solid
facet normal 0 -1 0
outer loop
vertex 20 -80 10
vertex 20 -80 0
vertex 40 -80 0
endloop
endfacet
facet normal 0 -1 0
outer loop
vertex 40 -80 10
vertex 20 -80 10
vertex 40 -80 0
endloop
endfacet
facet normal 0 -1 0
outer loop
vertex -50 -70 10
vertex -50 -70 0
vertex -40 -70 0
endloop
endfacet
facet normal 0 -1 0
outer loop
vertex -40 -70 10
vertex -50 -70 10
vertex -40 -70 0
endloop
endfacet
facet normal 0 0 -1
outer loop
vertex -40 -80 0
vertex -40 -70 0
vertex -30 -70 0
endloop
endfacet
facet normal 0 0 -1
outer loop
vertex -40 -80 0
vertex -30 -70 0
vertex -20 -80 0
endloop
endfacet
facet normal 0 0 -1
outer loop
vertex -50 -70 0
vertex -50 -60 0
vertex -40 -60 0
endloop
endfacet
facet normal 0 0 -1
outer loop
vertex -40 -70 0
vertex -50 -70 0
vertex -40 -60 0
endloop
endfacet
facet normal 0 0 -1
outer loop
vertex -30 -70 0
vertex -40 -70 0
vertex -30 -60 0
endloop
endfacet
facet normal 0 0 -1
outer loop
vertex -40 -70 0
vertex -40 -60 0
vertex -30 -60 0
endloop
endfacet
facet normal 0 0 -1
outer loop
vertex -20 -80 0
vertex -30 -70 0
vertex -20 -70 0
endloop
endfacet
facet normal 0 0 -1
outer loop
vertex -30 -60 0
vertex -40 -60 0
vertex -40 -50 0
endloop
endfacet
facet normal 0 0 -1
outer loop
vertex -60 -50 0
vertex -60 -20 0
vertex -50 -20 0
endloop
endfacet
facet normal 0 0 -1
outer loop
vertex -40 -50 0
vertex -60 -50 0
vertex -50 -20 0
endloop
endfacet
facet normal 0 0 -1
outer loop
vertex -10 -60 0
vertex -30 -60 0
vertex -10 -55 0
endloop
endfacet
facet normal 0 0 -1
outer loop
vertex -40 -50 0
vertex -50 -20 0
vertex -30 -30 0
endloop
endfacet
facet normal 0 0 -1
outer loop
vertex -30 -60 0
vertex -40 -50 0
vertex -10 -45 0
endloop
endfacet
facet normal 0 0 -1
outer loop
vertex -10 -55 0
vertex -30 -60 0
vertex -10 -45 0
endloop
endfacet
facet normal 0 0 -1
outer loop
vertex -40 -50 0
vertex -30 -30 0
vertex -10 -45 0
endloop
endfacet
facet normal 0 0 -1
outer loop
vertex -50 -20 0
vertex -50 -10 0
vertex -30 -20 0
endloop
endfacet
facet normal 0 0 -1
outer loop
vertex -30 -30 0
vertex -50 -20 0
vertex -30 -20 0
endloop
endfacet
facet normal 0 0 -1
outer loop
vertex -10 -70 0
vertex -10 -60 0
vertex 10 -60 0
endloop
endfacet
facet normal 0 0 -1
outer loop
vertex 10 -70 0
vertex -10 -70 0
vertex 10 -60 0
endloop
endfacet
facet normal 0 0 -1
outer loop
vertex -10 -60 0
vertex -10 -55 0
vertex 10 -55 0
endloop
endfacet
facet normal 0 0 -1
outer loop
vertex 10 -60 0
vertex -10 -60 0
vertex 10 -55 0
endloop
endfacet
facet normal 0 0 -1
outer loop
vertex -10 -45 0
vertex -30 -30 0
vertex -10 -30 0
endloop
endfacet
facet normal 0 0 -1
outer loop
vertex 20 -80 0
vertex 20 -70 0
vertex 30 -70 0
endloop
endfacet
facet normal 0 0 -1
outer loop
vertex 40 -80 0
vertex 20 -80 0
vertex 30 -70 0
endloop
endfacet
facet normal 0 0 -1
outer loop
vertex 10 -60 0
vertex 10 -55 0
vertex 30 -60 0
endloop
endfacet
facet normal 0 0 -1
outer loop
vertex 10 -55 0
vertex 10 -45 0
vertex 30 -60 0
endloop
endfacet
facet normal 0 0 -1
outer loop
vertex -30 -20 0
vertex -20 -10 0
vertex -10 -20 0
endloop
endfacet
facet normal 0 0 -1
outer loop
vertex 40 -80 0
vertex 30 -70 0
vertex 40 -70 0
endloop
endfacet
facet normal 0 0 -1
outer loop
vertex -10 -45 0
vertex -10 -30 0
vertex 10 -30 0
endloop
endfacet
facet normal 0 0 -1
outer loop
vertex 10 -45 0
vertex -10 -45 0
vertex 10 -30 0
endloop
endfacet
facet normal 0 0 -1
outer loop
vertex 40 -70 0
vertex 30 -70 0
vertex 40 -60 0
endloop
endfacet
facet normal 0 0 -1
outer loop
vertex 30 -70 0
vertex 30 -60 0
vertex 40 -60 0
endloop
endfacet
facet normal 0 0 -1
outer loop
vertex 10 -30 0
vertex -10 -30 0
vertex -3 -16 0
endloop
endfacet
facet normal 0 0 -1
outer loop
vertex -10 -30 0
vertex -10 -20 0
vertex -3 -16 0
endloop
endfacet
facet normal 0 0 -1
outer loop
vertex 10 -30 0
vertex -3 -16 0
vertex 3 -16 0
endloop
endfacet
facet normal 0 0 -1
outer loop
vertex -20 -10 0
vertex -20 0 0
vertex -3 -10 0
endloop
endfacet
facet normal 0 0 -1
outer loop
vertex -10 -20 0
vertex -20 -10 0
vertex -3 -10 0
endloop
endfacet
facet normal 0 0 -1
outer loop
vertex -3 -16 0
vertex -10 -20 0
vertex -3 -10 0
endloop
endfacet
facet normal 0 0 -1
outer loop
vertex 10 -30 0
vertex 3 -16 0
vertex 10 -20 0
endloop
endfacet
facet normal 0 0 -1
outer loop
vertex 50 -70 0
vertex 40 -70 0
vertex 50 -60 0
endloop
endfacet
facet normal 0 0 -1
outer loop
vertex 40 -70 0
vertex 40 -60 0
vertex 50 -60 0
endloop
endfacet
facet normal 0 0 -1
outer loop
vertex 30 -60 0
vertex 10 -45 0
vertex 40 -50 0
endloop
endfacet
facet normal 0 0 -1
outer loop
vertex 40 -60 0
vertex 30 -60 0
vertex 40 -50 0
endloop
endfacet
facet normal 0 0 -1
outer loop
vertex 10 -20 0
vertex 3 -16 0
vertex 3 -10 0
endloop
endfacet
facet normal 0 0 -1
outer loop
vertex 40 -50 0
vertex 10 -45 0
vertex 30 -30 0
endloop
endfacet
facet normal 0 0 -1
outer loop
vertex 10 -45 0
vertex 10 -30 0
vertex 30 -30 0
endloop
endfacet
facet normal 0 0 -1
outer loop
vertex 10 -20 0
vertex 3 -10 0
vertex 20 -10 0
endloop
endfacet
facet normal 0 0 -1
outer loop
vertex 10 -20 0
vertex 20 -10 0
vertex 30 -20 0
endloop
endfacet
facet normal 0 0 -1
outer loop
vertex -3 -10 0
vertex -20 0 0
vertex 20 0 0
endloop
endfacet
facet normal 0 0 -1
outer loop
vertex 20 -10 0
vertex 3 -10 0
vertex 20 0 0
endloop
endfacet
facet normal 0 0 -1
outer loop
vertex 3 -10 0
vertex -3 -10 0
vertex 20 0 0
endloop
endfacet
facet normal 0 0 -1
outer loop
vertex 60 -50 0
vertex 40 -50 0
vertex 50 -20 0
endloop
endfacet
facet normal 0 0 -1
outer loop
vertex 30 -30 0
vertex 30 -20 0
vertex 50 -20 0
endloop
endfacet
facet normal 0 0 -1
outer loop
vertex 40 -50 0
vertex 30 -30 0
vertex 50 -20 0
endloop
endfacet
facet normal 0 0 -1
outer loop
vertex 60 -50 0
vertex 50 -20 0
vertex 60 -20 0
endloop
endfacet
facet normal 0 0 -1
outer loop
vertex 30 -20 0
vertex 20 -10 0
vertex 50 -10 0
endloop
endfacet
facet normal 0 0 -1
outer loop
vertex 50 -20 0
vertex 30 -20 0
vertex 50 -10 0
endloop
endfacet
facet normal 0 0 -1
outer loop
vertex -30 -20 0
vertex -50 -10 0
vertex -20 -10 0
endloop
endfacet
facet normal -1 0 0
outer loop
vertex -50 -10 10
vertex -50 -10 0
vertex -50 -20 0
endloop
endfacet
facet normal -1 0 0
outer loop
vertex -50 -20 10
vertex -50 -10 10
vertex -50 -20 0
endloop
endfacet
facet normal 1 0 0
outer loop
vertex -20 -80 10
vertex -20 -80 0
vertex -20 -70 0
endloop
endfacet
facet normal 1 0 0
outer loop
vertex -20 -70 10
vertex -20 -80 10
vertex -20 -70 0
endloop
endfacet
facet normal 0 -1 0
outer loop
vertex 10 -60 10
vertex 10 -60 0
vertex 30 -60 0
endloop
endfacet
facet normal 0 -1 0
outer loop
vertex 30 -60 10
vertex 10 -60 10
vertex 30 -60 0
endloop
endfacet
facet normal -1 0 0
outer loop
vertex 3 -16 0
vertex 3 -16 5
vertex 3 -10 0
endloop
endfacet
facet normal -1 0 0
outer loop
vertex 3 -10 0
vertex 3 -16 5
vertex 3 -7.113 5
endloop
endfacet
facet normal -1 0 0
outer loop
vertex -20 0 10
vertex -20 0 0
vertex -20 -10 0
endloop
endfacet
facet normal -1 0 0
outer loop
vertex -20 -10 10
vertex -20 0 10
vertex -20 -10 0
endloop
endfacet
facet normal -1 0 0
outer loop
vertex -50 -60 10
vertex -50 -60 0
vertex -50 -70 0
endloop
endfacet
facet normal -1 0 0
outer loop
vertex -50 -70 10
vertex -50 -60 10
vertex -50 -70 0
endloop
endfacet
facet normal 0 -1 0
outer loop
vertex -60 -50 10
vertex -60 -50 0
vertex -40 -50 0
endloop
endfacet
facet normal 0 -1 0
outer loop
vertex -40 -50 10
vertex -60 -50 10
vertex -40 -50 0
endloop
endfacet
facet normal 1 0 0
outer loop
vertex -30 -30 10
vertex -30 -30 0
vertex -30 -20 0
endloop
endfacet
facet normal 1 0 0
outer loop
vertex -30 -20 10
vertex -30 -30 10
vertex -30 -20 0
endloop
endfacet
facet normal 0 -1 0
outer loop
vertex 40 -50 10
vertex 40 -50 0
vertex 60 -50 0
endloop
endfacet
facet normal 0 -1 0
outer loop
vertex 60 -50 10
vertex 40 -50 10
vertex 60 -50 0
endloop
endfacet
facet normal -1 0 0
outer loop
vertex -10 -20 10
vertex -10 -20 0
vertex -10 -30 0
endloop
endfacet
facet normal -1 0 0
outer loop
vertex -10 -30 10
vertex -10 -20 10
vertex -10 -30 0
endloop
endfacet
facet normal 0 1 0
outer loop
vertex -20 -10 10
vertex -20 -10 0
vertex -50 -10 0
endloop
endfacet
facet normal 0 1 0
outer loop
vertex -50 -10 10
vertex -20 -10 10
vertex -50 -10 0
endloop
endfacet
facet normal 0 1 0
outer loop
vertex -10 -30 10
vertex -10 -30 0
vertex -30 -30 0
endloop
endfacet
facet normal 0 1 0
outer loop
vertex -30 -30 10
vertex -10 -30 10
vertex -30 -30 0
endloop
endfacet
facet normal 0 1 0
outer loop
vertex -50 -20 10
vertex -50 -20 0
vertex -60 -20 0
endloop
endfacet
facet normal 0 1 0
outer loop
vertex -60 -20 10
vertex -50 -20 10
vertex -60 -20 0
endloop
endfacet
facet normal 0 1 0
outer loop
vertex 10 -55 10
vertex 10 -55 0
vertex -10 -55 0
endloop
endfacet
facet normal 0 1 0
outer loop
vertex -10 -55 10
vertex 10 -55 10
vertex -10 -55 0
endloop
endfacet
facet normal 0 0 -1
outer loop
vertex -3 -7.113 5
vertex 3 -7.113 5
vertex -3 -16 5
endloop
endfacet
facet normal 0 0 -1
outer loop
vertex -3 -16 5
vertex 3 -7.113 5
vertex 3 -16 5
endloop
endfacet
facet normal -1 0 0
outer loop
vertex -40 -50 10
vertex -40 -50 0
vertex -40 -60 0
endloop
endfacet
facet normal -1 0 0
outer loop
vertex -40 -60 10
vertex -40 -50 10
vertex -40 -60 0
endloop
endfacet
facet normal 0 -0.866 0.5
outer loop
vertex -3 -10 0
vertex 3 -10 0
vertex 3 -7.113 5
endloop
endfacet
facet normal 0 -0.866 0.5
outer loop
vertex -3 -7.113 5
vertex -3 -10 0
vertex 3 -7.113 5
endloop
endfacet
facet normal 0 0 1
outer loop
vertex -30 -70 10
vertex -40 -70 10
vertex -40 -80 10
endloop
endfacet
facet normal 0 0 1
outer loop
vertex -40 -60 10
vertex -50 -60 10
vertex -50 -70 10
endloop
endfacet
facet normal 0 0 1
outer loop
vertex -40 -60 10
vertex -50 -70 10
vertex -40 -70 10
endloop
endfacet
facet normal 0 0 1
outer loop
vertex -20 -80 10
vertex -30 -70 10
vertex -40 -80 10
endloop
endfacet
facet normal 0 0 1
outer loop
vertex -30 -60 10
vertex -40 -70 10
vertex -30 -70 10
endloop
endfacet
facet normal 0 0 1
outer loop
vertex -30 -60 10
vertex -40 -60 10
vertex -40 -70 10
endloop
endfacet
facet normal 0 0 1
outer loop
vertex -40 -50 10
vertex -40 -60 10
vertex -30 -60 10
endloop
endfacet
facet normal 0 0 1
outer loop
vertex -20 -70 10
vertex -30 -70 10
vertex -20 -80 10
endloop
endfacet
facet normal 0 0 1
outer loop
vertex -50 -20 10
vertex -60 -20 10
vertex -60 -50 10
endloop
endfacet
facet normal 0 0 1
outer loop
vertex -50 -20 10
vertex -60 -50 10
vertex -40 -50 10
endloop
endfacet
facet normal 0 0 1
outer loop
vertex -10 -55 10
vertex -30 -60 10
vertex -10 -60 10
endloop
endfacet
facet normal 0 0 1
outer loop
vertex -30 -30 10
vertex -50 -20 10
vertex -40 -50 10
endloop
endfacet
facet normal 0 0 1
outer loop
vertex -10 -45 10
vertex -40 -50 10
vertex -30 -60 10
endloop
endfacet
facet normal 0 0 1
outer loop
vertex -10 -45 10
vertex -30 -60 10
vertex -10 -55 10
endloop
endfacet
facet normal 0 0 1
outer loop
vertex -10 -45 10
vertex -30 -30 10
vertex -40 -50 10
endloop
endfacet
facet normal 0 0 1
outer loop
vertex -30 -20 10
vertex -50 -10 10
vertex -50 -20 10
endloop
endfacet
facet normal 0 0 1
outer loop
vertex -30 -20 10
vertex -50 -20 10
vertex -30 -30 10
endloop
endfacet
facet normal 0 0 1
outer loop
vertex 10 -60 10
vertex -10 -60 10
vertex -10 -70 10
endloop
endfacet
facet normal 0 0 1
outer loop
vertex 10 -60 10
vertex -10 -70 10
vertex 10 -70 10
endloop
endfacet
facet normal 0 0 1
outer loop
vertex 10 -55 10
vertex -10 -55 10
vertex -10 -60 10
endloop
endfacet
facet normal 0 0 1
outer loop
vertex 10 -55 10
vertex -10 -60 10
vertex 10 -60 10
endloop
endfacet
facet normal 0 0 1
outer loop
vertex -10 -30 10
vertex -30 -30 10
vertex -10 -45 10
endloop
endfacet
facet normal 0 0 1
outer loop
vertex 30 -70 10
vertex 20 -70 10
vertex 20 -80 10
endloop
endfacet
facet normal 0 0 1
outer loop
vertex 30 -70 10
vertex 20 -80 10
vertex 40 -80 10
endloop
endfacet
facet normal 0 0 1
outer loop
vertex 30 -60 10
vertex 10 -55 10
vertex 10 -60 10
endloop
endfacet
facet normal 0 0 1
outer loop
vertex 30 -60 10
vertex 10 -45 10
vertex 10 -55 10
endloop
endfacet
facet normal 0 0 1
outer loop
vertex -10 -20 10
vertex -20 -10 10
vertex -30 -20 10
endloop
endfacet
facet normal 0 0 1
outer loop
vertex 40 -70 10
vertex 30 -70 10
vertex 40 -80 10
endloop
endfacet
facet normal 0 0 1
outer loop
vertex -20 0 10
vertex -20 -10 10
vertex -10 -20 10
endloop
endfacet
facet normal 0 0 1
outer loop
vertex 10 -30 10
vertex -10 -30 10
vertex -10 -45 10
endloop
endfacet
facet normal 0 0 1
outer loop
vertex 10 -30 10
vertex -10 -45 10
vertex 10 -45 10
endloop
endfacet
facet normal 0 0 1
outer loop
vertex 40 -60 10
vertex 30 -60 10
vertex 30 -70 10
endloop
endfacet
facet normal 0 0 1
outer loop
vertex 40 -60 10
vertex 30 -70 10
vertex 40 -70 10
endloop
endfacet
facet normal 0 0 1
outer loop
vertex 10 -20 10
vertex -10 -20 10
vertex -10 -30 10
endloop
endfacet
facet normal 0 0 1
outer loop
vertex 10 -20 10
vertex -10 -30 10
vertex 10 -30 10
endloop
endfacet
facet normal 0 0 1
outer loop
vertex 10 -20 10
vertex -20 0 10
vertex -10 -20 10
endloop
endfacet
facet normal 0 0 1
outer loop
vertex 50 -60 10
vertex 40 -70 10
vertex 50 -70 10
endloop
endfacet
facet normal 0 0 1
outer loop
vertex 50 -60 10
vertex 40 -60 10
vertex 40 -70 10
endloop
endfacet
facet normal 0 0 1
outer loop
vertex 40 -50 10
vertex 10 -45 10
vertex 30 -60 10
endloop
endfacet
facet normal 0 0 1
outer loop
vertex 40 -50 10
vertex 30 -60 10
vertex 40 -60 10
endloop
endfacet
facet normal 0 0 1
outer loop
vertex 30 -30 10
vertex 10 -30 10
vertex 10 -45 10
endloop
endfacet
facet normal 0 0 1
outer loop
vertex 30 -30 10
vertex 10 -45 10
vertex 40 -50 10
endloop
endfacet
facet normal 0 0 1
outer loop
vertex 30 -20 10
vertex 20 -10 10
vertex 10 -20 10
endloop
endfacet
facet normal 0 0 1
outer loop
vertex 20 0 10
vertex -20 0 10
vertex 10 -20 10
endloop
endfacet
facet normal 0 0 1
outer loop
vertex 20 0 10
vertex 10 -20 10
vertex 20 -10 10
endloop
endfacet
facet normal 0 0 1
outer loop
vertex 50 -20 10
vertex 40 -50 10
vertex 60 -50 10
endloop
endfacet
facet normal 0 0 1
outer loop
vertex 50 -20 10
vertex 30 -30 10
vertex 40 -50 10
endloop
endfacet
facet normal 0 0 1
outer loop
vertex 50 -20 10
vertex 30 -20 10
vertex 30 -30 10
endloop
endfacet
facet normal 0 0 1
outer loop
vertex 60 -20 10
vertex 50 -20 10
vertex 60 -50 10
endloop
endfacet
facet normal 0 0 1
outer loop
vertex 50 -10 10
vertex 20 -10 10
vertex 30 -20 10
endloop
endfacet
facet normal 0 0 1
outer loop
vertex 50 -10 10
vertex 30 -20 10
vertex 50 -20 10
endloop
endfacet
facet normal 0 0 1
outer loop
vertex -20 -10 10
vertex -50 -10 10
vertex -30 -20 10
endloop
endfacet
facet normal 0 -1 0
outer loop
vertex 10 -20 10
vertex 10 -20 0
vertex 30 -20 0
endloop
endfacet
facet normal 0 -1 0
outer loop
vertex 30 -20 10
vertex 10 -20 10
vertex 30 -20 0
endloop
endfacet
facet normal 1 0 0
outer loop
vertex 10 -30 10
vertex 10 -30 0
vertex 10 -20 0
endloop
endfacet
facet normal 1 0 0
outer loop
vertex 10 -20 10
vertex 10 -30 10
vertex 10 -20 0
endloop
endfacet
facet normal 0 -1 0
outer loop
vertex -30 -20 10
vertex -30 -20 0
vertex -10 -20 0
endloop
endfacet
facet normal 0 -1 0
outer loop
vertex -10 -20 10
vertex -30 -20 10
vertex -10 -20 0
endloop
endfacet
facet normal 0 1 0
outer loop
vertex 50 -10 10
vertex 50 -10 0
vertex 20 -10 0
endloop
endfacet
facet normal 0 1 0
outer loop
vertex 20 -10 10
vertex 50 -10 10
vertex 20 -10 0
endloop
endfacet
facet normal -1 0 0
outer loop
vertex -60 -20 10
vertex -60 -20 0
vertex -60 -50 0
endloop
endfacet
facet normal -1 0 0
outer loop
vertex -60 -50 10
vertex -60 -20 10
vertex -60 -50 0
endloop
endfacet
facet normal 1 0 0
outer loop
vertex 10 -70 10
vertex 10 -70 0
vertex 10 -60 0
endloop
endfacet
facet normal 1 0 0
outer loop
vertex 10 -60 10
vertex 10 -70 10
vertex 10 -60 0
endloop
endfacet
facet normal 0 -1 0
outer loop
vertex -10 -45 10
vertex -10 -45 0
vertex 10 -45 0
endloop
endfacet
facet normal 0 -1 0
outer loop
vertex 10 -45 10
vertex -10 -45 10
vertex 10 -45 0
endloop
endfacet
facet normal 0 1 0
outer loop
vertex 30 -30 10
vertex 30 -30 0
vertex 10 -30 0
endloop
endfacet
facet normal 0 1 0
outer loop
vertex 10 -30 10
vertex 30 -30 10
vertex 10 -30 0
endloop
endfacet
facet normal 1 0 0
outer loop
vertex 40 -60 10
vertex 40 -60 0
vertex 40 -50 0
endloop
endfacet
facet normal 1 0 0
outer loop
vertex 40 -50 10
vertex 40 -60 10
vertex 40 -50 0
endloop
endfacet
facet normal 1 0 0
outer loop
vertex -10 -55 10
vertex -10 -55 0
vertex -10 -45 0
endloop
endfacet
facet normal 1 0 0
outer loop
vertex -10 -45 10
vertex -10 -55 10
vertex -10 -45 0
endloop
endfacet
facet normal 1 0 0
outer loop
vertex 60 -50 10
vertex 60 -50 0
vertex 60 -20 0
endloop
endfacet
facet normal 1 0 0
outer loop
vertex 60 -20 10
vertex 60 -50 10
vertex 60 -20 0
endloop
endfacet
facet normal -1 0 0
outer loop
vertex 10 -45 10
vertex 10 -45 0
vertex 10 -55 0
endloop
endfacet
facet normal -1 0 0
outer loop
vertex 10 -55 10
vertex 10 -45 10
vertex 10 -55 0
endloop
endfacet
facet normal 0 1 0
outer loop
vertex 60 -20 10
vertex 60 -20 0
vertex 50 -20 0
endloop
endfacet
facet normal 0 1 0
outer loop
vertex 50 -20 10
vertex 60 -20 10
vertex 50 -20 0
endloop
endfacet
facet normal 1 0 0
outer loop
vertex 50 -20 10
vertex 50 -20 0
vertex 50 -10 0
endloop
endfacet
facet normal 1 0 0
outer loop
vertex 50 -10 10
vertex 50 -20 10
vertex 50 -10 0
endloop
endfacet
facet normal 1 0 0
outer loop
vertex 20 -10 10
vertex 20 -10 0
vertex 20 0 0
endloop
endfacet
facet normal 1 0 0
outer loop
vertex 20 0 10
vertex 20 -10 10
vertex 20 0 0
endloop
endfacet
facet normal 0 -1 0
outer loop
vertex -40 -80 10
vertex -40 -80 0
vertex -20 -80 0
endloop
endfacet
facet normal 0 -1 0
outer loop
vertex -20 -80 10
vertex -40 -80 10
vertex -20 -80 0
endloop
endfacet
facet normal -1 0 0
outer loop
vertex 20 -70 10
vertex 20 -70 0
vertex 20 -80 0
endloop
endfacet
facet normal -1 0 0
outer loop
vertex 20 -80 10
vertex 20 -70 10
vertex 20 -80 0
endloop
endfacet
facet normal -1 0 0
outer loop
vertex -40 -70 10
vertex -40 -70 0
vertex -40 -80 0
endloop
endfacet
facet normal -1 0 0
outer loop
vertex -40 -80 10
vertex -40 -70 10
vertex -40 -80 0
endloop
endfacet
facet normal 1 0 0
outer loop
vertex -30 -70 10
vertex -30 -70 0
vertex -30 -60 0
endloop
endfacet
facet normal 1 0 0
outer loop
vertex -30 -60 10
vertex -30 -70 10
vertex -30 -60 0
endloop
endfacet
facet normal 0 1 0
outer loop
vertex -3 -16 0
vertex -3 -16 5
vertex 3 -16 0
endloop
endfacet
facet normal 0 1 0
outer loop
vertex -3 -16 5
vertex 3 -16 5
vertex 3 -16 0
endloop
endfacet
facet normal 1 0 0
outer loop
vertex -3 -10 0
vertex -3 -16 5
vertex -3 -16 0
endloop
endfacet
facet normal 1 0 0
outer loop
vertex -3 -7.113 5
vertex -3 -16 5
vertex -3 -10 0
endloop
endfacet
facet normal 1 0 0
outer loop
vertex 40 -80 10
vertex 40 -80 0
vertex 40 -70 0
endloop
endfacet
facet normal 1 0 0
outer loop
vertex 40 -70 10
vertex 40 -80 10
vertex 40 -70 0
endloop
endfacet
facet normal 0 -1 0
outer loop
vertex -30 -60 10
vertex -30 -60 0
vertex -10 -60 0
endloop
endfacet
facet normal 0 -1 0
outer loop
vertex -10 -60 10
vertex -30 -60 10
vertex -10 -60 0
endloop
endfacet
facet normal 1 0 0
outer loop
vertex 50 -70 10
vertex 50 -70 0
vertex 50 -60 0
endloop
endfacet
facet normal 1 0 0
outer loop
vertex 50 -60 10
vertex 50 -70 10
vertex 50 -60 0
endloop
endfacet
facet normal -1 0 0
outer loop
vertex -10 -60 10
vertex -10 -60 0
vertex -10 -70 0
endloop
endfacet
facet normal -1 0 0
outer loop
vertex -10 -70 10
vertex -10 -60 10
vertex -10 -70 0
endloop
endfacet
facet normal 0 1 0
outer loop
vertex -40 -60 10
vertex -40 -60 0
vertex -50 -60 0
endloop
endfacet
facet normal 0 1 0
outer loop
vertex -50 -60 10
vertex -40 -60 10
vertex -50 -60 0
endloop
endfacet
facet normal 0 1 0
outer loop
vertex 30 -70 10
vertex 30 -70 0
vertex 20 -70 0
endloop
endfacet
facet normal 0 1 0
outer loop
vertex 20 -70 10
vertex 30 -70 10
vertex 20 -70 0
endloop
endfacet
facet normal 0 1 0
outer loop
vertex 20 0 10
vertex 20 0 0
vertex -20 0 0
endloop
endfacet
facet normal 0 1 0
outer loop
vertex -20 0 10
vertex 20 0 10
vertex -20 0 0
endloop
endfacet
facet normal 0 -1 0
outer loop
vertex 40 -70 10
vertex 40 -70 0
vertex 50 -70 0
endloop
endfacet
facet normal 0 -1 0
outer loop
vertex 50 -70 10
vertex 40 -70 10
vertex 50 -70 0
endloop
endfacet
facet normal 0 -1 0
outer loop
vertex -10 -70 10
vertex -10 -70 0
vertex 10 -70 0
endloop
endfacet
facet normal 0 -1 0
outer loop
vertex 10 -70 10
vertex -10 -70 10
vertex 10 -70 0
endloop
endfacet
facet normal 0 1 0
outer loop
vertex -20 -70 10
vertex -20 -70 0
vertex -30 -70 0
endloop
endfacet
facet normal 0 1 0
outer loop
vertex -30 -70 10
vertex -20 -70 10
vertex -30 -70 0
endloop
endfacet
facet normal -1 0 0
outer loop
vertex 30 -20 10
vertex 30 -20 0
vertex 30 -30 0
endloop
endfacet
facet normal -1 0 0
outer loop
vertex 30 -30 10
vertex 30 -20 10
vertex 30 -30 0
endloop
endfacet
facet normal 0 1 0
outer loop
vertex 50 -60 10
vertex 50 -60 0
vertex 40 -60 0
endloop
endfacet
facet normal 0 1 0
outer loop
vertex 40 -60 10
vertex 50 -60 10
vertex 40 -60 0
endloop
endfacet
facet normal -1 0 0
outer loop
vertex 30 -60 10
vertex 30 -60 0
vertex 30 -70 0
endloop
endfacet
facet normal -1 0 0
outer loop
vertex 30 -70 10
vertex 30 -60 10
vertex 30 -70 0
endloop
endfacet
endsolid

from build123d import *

# Parameters (mm, degrees)
F0_R     = 6
F1_DEPTH = 10
F3_DEPTH = 3


with BuildPart() as f1:
    # F0 (on Top) → F1 (new body)
    with BuildSketch(Plane.XY):
        Polygon((10, 0), (0, 0), (-10, 0), (-20, 0), (-20, -10), (-30, -10), (-40, -10), (-50, -10), (-50, -20), (-60, -20), (-60, -30), (-60, -40), (-60, -50), (-50, -50), (-40, -50), (-40, -60), (-50, -60), (-50, -70), (-40, -70), (-40, -80), (-30, -80), (-20, -80), (-20, -70), (-30, -70), (-30, -60), (-20, -60), (-10, -60), (-10, -70), (0, -70), (10, -70), (10, -60), (20, -60), (30, -60), (30, -70), (20, -70), (20, -80), (30, -80), (40, -80), (40, -70), (50, -70), (50, -60), (40, -60), (40, -50), (50, -50), (60, -50), (60, -40), (60, -30), (60, -20), (50, -20), (50, -10), (40, -10), (30, -10), (20, -10), (20, 0), align=None)
        Polygon((-10, -45), (0, -45), (10, -45), (10, -55), (0, -55), (-10, -55), align=None, mode=Mode.SUBTRACT)
        Polygon((-30, -30), (-30, -20), (-20, -20), (-10, -20), (-10, -30), (-20, -30), align=None, mode=Mode.SUBTRACT)
        Polygon((10, -20), (20, -20), (30, -20), (30, -30), (20, -30), (10, -30), align=None, mode=Mode.SUBTRACT)
        with Locations((0, -12)):
            Circle(F0_R, mode=Mode.SUBTRACT)
        with Locations((0, -12)):
            Circle(F0_R)
    extrude(amount=F1_DEPTH)

    # F2 (on Right) → F3 (cut, symmetric)
    with BuildSketch(Plane.YZ):
        Polygon((-16, 5), (-16, 0), (-10, 0), (-7.1132486541, 5), align=None)
    extrude(amount=F3_DEPTH, both=True, mode=Mode.SUBTRACT)


solid = f1.part
